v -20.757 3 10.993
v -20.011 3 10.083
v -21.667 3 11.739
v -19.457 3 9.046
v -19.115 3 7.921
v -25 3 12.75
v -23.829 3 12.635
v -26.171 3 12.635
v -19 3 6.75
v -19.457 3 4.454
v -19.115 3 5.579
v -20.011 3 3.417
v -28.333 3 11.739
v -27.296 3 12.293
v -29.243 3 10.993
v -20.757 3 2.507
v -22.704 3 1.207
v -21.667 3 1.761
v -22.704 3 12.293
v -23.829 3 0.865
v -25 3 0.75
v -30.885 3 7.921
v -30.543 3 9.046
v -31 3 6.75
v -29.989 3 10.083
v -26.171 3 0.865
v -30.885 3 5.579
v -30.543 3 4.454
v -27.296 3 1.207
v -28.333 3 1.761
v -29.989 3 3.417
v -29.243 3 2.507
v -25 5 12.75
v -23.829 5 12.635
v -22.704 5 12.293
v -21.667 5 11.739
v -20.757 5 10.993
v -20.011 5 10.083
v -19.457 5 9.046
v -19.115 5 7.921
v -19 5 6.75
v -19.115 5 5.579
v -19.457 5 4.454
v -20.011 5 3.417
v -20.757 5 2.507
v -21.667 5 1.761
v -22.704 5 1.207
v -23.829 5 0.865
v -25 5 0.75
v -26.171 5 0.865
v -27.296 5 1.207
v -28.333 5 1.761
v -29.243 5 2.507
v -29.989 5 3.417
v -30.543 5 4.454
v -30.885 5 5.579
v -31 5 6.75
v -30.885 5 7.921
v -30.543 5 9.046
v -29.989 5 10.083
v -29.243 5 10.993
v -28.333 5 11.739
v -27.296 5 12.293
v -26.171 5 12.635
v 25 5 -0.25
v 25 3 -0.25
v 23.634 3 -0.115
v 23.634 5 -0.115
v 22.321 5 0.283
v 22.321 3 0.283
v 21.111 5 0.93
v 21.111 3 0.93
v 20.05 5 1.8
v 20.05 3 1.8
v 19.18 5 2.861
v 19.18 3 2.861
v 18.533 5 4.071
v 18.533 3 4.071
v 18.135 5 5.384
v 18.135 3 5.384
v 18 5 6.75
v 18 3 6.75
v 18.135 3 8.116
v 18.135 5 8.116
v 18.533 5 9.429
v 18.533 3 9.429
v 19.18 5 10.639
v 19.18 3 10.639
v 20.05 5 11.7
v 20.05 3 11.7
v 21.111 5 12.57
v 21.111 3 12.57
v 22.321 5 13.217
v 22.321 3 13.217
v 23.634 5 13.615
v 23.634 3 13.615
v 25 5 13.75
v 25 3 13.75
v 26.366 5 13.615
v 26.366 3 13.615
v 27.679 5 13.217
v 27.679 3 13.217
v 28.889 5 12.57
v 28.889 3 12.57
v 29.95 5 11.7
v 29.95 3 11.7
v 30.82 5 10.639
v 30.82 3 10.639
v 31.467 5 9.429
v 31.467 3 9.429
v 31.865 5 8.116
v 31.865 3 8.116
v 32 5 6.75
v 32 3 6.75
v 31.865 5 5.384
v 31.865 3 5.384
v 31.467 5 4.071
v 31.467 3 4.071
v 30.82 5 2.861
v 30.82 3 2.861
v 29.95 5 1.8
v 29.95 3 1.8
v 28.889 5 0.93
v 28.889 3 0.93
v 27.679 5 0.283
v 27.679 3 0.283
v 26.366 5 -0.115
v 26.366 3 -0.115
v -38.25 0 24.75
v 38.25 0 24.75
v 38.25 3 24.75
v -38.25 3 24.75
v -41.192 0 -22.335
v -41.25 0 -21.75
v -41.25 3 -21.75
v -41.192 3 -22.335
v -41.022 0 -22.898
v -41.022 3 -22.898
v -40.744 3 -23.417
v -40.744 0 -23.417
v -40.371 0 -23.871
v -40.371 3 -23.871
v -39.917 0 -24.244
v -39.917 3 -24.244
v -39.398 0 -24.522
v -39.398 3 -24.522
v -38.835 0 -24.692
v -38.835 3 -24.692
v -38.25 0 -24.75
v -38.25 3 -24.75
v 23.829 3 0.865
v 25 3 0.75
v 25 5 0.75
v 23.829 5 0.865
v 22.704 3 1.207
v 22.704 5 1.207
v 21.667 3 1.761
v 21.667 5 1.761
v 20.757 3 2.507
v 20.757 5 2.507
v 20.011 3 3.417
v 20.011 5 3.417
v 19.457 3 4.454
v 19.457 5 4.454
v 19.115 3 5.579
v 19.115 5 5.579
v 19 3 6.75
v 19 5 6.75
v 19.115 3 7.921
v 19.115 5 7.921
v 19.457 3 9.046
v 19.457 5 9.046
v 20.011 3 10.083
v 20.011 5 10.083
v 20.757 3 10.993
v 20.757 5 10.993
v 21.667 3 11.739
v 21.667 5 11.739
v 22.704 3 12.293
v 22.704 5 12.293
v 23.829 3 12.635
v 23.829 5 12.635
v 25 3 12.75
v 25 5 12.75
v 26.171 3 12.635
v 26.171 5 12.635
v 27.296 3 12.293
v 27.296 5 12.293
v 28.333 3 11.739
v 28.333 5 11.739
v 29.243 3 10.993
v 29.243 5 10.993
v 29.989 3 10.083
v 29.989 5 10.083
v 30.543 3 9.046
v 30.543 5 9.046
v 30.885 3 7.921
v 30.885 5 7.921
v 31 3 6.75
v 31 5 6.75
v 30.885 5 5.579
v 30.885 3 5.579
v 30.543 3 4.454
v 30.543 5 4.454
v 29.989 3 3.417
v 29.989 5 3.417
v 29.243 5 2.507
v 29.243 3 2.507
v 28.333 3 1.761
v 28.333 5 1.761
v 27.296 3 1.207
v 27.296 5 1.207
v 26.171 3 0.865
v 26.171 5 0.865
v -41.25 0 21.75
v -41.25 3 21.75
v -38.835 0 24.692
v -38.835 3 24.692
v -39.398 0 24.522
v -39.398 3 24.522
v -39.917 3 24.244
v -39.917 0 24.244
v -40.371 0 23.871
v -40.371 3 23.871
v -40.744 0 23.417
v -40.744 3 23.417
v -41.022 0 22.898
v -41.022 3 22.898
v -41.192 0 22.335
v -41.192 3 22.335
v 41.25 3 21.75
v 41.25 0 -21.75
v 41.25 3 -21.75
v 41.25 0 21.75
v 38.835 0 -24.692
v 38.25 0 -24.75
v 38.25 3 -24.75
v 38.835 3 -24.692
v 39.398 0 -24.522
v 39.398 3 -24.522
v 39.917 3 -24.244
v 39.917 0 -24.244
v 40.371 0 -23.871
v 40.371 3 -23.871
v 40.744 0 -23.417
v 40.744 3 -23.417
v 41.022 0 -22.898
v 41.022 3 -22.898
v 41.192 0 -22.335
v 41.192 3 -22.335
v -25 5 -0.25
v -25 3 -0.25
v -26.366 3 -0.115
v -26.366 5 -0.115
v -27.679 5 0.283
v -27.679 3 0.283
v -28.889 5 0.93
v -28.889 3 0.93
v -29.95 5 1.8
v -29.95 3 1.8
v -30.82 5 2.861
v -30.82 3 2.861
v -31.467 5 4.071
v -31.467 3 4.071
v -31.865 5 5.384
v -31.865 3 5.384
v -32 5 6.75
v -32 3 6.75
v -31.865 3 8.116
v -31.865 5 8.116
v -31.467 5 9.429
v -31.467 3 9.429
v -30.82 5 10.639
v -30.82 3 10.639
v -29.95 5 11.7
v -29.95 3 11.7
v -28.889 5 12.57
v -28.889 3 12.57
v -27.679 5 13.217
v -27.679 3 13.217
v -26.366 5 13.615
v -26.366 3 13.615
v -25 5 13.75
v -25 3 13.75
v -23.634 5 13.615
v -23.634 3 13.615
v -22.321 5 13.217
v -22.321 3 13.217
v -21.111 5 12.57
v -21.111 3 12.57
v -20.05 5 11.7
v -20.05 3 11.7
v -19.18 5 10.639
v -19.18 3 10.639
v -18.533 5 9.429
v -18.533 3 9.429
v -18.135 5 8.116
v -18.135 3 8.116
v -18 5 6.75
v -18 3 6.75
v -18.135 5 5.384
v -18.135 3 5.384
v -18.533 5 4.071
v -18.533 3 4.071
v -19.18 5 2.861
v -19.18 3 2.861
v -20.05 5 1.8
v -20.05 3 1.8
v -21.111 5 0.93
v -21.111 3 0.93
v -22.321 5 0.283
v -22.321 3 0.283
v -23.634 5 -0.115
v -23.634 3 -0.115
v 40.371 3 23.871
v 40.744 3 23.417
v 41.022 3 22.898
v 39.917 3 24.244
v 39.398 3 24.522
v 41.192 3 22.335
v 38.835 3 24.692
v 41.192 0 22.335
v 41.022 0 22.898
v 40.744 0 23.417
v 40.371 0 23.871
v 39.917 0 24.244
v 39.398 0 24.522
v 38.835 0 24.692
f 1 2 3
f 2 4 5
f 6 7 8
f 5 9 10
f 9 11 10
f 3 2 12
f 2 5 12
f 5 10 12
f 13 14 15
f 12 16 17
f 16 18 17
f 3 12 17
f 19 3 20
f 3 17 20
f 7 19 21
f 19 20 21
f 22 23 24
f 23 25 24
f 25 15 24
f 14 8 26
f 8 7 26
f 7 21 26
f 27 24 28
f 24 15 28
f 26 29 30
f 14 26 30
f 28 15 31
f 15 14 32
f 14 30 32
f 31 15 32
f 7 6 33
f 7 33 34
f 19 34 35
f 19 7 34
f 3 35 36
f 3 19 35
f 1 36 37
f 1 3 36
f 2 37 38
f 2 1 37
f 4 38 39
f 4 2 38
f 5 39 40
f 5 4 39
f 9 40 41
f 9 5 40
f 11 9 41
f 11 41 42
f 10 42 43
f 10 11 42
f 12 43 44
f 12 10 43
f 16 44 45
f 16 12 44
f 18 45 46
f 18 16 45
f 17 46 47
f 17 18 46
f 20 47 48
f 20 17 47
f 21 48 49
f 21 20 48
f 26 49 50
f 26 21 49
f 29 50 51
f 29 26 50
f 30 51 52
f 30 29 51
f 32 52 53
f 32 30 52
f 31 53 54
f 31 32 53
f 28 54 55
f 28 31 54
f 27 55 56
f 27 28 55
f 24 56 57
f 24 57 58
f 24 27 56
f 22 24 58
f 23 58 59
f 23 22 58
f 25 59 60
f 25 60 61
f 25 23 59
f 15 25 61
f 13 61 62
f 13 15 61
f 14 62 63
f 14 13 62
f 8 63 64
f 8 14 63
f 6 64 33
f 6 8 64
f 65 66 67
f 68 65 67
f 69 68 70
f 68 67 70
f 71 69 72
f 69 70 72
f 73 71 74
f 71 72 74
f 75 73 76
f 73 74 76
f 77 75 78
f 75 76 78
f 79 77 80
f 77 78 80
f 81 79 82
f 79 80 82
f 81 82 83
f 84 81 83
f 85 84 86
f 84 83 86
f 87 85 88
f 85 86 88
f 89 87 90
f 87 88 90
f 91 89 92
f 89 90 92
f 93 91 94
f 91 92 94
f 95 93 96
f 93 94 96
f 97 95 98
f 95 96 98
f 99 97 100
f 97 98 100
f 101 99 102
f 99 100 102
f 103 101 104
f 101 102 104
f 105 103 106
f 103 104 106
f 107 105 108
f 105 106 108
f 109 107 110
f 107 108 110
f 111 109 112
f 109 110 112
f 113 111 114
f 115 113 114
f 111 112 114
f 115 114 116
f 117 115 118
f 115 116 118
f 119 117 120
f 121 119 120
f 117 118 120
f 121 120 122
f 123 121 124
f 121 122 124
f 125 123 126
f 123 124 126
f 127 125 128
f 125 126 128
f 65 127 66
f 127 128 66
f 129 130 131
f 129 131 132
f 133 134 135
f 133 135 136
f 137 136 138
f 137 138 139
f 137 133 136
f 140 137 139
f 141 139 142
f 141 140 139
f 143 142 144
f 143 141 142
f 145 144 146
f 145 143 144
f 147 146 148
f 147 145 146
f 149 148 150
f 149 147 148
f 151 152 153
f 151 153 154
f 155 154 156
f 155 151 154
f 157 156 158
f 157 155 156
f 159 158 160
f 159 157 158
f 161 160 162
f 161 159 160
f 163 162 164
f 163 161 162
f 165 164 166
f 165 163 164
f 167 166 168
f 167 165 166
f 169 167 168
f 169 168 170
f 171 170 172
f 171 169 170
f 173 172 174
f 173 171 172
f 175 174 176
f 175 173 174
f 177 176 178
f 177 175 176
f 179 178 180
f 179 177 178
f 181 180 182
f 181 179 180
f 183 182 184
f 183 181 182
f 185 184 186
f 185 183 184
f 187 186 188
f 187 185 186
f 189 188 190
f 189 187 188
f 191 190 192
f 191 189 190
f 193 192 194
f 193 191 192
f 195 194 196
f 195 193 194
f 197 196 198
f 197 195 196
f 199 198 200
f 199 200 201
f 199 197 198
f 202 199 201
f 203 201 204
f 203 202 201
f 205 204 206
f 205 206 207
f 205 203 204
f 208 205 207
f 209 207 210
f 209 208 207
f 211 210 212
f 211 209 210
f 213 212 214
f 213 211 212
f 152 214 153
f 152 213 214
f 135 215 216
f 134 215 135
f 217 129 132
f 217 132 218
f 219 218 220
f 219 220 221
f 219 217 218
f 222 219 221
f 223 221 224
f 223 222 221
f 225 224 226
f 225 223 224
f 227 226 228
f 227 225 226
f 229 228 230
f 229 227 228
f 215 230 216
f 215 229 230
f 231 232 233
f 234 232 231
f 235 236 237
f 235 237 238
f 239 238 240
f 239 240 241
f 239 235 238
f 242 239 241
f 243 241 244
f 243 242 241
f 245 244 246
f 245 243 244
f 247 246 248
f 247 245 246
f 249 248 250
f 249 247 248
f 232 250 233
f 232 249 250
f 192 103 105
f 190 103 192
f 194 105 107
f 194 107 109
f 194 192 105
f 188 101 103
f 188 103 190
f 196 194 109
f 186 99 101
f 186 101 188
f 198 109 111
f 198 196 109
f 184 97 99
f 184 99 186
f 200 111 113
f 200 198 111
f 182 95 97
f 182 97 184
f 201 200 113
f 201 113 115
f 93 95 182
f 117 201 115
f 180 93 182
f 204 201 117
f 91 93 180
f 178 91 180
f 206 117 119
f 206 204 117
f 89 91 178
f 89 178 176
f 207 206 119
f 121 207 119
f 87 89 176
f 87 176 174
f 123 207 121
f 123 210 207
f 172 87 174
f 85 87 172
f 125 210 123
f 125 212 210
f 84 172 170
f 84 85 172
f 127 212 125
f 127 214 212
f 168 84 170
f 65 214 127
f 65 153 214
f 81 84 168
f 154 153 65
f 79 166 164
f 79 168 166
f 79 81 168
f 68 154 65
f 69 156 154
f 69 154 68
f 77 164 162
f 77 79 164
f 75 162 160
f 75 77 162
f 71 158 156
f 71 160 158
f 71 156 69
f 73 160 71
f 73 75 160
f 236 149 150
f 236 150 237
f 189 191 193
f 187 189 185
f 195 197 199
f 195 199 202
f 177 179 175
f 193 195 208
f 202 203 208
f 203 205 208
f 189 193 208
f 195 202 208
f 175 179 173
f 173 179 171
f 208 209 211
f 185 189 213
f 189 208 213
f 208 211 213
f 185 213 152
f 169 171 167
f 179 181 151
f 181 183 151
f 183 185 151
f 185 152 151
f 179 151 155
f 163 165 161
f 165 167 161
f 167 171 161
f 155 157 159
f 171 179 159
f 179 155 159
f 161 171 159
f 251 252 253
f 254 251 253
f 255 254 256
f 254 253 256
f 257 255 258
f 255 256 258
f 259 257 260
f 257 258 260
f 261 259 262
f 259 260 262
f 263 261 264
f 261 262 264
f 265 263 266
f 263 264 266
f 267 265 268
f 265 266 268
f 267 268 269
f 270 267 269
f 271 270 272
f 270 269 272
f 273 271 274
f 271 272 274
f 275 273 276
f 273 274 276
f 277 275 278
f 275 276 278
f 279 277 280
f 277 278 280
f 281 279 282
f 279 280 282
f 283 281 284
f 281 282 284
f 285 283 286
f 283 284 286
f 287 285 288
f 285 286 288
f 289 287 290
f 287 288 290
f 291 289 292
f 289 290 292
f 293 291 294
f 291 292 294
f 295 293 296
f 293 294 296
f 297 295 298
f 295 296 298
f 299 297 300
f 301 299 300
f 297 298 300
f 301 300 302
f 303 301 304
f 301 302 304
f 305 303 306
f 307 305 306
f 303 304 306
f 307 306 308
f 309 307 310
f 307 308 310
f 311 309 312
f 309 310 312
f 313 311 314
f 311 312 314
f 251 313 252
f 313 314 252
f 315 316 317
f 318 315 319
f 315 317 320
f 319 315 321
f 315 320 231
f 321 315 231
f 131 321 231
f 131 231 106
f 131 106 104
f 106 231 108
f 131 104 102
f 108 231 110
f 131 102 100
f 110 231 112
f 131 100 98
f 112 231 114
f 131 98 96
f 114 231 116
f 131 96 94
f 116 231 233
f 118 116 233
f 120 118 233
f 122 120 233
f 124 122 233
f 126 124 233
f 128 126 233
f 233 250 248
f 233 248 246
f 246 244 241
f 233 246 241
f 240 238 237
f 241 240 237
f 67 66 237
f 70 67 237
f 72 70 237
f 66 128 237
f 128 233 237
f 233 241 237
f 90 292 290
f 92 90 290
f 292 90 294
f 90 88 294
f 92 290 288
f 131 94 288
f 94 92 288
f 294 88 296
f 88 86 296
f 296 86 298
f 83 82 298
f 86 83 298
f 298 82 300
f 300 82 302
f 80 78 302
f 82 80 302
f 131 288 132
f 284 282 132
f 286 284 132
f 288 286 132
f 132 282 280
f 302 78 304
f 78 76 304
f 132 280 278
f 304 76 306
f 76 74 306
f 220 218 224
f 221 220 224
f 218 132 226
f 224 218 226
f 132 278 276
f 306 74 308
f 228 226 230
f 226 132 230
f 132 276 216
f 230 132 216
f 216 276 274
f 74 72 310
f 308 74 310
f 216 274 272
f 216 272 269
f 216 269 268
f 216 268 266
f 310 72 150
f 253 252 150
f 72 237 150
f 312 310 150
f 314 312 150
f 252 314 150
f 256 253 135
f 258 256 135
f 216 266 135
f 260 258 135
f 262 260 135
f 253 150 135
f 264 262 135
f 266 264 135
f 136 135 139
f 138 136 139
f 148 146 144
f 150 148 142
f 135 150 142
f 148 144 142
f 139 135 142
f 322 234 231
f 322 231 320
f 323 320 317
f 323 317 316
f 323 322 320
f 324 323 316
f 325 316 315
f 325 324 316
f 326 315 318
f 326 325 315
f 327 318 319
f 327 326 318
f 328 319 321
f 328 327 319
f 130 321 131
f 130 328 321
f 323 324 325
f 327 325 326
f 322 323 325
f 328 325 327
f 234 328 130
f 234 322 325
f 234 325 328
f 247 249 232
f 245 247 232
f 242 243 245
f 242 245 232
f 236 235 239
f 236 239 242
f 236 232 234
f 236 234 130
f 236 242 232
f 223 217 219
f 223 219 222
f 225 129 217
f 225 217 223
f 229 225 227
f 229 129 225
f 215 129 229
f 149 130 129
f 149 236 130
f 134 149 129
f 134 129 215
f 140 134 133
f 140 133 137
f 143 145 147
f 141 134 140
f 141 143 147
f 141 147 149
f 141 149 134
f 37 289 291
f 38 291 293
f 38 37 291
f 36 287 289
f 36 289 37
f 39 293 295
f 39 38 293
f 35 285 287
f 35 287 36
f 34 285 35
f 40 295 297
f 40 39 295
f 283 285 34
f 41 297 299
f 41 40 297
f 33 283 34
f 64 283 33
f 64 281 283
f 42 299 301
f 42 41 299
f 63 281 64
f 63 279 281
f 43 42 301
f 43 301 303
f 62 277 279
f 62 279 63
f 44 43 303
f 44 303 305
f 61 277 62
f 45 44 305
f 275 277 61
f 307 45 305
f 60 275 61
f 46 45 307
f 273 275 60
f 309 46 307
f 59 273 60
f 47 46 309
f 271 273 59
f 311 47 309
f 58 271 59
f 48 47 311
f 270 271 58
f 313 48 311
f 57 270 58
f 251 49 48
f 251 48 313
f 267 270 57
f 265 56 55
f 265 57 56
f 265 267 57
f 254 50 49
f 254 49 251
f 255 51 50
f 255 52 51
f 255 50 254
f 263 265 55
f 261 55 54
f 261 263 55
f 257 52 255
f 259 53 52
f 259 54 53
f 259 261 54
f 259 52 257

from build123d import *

# Parameters (mm, degrees)
BOSS_EXTRUDE1_DEPTH = 3
SKETCH2_R           = 7
SKETCH2_R_2         = 6
BOSS_EXTRUDE2_DEPTH = 2


with BuildPart() as part:
    # Sketch1 → Boss-Extrude1 (new body)
    with BuildSketch(Plane(origin=(0, 0, 0), x_dir=(1, 0, 0), z_dir=(0, 1, 0))):
        with BuildLine():
            Line((-38.25, 24.75), (38.25, 24.75))
            ThreePointArc((38.25, 24.75), (40.371320344, 23.871320344), (41.25, 21.75))
            Line((41.25, 21.75), (41.25, -21.75))
            ThreePointArc((41.25, -21.75), (40.371320344, -23.871320344), (38.25, -24.75))
            Line((38.25, -24.75), (-38.25, -24.75))
            ThreePointArc((-38.25, -24.75), (-40.371320344, -23.871320344), (-41.25, -21.75))
            Line((-41.25, -21.75), (-41.25, 21.75))
            ThreePointArc((-41.25, 21.75), (-40.371320344, 23.871320344), (-38.25, 24.75))
        make_face()
    extrude(amount=BOSS_EXTRUDE1_DEPTH)

    # Sketch2 → Boss-Extrude2 (add)
    # profile 1 of 2: a face of its own
    with BuildSketch(Plane(origin=(0, 3, 0), x_dir=(1, 0, 0), z_dir=(0, 1, 0))):
        with Locations(Location((-25, -6.75, 0), (0, 0, 90))):
            Circle(SKETCH2_R)
        with Locations(Location((-25, -6.75, 0), (0, 0, 270))):
            Circle(SKETCH2_R_2, mode=Mode.SUBTRACT)
    # profile 2 of 2: a face of its own
    with BuildSketch(Plane(origin=(0, 3, 0), x_dir=(1, 0, 0), z_dir=(0, 1, 0))):
        with Locations(Location((25, -6.75, 0), (0, 0, 90))):
            Circle(SKETCH2_R)
        with Locations(Location((25, -6.75, 0), (0, 0, 90))):
            Circle(SKETCH2_R_2, mode=Mode.SUBTRACT)
    extrude(amount=BOSS_EXTRUDE2_DEPTH)


solid = part.part
